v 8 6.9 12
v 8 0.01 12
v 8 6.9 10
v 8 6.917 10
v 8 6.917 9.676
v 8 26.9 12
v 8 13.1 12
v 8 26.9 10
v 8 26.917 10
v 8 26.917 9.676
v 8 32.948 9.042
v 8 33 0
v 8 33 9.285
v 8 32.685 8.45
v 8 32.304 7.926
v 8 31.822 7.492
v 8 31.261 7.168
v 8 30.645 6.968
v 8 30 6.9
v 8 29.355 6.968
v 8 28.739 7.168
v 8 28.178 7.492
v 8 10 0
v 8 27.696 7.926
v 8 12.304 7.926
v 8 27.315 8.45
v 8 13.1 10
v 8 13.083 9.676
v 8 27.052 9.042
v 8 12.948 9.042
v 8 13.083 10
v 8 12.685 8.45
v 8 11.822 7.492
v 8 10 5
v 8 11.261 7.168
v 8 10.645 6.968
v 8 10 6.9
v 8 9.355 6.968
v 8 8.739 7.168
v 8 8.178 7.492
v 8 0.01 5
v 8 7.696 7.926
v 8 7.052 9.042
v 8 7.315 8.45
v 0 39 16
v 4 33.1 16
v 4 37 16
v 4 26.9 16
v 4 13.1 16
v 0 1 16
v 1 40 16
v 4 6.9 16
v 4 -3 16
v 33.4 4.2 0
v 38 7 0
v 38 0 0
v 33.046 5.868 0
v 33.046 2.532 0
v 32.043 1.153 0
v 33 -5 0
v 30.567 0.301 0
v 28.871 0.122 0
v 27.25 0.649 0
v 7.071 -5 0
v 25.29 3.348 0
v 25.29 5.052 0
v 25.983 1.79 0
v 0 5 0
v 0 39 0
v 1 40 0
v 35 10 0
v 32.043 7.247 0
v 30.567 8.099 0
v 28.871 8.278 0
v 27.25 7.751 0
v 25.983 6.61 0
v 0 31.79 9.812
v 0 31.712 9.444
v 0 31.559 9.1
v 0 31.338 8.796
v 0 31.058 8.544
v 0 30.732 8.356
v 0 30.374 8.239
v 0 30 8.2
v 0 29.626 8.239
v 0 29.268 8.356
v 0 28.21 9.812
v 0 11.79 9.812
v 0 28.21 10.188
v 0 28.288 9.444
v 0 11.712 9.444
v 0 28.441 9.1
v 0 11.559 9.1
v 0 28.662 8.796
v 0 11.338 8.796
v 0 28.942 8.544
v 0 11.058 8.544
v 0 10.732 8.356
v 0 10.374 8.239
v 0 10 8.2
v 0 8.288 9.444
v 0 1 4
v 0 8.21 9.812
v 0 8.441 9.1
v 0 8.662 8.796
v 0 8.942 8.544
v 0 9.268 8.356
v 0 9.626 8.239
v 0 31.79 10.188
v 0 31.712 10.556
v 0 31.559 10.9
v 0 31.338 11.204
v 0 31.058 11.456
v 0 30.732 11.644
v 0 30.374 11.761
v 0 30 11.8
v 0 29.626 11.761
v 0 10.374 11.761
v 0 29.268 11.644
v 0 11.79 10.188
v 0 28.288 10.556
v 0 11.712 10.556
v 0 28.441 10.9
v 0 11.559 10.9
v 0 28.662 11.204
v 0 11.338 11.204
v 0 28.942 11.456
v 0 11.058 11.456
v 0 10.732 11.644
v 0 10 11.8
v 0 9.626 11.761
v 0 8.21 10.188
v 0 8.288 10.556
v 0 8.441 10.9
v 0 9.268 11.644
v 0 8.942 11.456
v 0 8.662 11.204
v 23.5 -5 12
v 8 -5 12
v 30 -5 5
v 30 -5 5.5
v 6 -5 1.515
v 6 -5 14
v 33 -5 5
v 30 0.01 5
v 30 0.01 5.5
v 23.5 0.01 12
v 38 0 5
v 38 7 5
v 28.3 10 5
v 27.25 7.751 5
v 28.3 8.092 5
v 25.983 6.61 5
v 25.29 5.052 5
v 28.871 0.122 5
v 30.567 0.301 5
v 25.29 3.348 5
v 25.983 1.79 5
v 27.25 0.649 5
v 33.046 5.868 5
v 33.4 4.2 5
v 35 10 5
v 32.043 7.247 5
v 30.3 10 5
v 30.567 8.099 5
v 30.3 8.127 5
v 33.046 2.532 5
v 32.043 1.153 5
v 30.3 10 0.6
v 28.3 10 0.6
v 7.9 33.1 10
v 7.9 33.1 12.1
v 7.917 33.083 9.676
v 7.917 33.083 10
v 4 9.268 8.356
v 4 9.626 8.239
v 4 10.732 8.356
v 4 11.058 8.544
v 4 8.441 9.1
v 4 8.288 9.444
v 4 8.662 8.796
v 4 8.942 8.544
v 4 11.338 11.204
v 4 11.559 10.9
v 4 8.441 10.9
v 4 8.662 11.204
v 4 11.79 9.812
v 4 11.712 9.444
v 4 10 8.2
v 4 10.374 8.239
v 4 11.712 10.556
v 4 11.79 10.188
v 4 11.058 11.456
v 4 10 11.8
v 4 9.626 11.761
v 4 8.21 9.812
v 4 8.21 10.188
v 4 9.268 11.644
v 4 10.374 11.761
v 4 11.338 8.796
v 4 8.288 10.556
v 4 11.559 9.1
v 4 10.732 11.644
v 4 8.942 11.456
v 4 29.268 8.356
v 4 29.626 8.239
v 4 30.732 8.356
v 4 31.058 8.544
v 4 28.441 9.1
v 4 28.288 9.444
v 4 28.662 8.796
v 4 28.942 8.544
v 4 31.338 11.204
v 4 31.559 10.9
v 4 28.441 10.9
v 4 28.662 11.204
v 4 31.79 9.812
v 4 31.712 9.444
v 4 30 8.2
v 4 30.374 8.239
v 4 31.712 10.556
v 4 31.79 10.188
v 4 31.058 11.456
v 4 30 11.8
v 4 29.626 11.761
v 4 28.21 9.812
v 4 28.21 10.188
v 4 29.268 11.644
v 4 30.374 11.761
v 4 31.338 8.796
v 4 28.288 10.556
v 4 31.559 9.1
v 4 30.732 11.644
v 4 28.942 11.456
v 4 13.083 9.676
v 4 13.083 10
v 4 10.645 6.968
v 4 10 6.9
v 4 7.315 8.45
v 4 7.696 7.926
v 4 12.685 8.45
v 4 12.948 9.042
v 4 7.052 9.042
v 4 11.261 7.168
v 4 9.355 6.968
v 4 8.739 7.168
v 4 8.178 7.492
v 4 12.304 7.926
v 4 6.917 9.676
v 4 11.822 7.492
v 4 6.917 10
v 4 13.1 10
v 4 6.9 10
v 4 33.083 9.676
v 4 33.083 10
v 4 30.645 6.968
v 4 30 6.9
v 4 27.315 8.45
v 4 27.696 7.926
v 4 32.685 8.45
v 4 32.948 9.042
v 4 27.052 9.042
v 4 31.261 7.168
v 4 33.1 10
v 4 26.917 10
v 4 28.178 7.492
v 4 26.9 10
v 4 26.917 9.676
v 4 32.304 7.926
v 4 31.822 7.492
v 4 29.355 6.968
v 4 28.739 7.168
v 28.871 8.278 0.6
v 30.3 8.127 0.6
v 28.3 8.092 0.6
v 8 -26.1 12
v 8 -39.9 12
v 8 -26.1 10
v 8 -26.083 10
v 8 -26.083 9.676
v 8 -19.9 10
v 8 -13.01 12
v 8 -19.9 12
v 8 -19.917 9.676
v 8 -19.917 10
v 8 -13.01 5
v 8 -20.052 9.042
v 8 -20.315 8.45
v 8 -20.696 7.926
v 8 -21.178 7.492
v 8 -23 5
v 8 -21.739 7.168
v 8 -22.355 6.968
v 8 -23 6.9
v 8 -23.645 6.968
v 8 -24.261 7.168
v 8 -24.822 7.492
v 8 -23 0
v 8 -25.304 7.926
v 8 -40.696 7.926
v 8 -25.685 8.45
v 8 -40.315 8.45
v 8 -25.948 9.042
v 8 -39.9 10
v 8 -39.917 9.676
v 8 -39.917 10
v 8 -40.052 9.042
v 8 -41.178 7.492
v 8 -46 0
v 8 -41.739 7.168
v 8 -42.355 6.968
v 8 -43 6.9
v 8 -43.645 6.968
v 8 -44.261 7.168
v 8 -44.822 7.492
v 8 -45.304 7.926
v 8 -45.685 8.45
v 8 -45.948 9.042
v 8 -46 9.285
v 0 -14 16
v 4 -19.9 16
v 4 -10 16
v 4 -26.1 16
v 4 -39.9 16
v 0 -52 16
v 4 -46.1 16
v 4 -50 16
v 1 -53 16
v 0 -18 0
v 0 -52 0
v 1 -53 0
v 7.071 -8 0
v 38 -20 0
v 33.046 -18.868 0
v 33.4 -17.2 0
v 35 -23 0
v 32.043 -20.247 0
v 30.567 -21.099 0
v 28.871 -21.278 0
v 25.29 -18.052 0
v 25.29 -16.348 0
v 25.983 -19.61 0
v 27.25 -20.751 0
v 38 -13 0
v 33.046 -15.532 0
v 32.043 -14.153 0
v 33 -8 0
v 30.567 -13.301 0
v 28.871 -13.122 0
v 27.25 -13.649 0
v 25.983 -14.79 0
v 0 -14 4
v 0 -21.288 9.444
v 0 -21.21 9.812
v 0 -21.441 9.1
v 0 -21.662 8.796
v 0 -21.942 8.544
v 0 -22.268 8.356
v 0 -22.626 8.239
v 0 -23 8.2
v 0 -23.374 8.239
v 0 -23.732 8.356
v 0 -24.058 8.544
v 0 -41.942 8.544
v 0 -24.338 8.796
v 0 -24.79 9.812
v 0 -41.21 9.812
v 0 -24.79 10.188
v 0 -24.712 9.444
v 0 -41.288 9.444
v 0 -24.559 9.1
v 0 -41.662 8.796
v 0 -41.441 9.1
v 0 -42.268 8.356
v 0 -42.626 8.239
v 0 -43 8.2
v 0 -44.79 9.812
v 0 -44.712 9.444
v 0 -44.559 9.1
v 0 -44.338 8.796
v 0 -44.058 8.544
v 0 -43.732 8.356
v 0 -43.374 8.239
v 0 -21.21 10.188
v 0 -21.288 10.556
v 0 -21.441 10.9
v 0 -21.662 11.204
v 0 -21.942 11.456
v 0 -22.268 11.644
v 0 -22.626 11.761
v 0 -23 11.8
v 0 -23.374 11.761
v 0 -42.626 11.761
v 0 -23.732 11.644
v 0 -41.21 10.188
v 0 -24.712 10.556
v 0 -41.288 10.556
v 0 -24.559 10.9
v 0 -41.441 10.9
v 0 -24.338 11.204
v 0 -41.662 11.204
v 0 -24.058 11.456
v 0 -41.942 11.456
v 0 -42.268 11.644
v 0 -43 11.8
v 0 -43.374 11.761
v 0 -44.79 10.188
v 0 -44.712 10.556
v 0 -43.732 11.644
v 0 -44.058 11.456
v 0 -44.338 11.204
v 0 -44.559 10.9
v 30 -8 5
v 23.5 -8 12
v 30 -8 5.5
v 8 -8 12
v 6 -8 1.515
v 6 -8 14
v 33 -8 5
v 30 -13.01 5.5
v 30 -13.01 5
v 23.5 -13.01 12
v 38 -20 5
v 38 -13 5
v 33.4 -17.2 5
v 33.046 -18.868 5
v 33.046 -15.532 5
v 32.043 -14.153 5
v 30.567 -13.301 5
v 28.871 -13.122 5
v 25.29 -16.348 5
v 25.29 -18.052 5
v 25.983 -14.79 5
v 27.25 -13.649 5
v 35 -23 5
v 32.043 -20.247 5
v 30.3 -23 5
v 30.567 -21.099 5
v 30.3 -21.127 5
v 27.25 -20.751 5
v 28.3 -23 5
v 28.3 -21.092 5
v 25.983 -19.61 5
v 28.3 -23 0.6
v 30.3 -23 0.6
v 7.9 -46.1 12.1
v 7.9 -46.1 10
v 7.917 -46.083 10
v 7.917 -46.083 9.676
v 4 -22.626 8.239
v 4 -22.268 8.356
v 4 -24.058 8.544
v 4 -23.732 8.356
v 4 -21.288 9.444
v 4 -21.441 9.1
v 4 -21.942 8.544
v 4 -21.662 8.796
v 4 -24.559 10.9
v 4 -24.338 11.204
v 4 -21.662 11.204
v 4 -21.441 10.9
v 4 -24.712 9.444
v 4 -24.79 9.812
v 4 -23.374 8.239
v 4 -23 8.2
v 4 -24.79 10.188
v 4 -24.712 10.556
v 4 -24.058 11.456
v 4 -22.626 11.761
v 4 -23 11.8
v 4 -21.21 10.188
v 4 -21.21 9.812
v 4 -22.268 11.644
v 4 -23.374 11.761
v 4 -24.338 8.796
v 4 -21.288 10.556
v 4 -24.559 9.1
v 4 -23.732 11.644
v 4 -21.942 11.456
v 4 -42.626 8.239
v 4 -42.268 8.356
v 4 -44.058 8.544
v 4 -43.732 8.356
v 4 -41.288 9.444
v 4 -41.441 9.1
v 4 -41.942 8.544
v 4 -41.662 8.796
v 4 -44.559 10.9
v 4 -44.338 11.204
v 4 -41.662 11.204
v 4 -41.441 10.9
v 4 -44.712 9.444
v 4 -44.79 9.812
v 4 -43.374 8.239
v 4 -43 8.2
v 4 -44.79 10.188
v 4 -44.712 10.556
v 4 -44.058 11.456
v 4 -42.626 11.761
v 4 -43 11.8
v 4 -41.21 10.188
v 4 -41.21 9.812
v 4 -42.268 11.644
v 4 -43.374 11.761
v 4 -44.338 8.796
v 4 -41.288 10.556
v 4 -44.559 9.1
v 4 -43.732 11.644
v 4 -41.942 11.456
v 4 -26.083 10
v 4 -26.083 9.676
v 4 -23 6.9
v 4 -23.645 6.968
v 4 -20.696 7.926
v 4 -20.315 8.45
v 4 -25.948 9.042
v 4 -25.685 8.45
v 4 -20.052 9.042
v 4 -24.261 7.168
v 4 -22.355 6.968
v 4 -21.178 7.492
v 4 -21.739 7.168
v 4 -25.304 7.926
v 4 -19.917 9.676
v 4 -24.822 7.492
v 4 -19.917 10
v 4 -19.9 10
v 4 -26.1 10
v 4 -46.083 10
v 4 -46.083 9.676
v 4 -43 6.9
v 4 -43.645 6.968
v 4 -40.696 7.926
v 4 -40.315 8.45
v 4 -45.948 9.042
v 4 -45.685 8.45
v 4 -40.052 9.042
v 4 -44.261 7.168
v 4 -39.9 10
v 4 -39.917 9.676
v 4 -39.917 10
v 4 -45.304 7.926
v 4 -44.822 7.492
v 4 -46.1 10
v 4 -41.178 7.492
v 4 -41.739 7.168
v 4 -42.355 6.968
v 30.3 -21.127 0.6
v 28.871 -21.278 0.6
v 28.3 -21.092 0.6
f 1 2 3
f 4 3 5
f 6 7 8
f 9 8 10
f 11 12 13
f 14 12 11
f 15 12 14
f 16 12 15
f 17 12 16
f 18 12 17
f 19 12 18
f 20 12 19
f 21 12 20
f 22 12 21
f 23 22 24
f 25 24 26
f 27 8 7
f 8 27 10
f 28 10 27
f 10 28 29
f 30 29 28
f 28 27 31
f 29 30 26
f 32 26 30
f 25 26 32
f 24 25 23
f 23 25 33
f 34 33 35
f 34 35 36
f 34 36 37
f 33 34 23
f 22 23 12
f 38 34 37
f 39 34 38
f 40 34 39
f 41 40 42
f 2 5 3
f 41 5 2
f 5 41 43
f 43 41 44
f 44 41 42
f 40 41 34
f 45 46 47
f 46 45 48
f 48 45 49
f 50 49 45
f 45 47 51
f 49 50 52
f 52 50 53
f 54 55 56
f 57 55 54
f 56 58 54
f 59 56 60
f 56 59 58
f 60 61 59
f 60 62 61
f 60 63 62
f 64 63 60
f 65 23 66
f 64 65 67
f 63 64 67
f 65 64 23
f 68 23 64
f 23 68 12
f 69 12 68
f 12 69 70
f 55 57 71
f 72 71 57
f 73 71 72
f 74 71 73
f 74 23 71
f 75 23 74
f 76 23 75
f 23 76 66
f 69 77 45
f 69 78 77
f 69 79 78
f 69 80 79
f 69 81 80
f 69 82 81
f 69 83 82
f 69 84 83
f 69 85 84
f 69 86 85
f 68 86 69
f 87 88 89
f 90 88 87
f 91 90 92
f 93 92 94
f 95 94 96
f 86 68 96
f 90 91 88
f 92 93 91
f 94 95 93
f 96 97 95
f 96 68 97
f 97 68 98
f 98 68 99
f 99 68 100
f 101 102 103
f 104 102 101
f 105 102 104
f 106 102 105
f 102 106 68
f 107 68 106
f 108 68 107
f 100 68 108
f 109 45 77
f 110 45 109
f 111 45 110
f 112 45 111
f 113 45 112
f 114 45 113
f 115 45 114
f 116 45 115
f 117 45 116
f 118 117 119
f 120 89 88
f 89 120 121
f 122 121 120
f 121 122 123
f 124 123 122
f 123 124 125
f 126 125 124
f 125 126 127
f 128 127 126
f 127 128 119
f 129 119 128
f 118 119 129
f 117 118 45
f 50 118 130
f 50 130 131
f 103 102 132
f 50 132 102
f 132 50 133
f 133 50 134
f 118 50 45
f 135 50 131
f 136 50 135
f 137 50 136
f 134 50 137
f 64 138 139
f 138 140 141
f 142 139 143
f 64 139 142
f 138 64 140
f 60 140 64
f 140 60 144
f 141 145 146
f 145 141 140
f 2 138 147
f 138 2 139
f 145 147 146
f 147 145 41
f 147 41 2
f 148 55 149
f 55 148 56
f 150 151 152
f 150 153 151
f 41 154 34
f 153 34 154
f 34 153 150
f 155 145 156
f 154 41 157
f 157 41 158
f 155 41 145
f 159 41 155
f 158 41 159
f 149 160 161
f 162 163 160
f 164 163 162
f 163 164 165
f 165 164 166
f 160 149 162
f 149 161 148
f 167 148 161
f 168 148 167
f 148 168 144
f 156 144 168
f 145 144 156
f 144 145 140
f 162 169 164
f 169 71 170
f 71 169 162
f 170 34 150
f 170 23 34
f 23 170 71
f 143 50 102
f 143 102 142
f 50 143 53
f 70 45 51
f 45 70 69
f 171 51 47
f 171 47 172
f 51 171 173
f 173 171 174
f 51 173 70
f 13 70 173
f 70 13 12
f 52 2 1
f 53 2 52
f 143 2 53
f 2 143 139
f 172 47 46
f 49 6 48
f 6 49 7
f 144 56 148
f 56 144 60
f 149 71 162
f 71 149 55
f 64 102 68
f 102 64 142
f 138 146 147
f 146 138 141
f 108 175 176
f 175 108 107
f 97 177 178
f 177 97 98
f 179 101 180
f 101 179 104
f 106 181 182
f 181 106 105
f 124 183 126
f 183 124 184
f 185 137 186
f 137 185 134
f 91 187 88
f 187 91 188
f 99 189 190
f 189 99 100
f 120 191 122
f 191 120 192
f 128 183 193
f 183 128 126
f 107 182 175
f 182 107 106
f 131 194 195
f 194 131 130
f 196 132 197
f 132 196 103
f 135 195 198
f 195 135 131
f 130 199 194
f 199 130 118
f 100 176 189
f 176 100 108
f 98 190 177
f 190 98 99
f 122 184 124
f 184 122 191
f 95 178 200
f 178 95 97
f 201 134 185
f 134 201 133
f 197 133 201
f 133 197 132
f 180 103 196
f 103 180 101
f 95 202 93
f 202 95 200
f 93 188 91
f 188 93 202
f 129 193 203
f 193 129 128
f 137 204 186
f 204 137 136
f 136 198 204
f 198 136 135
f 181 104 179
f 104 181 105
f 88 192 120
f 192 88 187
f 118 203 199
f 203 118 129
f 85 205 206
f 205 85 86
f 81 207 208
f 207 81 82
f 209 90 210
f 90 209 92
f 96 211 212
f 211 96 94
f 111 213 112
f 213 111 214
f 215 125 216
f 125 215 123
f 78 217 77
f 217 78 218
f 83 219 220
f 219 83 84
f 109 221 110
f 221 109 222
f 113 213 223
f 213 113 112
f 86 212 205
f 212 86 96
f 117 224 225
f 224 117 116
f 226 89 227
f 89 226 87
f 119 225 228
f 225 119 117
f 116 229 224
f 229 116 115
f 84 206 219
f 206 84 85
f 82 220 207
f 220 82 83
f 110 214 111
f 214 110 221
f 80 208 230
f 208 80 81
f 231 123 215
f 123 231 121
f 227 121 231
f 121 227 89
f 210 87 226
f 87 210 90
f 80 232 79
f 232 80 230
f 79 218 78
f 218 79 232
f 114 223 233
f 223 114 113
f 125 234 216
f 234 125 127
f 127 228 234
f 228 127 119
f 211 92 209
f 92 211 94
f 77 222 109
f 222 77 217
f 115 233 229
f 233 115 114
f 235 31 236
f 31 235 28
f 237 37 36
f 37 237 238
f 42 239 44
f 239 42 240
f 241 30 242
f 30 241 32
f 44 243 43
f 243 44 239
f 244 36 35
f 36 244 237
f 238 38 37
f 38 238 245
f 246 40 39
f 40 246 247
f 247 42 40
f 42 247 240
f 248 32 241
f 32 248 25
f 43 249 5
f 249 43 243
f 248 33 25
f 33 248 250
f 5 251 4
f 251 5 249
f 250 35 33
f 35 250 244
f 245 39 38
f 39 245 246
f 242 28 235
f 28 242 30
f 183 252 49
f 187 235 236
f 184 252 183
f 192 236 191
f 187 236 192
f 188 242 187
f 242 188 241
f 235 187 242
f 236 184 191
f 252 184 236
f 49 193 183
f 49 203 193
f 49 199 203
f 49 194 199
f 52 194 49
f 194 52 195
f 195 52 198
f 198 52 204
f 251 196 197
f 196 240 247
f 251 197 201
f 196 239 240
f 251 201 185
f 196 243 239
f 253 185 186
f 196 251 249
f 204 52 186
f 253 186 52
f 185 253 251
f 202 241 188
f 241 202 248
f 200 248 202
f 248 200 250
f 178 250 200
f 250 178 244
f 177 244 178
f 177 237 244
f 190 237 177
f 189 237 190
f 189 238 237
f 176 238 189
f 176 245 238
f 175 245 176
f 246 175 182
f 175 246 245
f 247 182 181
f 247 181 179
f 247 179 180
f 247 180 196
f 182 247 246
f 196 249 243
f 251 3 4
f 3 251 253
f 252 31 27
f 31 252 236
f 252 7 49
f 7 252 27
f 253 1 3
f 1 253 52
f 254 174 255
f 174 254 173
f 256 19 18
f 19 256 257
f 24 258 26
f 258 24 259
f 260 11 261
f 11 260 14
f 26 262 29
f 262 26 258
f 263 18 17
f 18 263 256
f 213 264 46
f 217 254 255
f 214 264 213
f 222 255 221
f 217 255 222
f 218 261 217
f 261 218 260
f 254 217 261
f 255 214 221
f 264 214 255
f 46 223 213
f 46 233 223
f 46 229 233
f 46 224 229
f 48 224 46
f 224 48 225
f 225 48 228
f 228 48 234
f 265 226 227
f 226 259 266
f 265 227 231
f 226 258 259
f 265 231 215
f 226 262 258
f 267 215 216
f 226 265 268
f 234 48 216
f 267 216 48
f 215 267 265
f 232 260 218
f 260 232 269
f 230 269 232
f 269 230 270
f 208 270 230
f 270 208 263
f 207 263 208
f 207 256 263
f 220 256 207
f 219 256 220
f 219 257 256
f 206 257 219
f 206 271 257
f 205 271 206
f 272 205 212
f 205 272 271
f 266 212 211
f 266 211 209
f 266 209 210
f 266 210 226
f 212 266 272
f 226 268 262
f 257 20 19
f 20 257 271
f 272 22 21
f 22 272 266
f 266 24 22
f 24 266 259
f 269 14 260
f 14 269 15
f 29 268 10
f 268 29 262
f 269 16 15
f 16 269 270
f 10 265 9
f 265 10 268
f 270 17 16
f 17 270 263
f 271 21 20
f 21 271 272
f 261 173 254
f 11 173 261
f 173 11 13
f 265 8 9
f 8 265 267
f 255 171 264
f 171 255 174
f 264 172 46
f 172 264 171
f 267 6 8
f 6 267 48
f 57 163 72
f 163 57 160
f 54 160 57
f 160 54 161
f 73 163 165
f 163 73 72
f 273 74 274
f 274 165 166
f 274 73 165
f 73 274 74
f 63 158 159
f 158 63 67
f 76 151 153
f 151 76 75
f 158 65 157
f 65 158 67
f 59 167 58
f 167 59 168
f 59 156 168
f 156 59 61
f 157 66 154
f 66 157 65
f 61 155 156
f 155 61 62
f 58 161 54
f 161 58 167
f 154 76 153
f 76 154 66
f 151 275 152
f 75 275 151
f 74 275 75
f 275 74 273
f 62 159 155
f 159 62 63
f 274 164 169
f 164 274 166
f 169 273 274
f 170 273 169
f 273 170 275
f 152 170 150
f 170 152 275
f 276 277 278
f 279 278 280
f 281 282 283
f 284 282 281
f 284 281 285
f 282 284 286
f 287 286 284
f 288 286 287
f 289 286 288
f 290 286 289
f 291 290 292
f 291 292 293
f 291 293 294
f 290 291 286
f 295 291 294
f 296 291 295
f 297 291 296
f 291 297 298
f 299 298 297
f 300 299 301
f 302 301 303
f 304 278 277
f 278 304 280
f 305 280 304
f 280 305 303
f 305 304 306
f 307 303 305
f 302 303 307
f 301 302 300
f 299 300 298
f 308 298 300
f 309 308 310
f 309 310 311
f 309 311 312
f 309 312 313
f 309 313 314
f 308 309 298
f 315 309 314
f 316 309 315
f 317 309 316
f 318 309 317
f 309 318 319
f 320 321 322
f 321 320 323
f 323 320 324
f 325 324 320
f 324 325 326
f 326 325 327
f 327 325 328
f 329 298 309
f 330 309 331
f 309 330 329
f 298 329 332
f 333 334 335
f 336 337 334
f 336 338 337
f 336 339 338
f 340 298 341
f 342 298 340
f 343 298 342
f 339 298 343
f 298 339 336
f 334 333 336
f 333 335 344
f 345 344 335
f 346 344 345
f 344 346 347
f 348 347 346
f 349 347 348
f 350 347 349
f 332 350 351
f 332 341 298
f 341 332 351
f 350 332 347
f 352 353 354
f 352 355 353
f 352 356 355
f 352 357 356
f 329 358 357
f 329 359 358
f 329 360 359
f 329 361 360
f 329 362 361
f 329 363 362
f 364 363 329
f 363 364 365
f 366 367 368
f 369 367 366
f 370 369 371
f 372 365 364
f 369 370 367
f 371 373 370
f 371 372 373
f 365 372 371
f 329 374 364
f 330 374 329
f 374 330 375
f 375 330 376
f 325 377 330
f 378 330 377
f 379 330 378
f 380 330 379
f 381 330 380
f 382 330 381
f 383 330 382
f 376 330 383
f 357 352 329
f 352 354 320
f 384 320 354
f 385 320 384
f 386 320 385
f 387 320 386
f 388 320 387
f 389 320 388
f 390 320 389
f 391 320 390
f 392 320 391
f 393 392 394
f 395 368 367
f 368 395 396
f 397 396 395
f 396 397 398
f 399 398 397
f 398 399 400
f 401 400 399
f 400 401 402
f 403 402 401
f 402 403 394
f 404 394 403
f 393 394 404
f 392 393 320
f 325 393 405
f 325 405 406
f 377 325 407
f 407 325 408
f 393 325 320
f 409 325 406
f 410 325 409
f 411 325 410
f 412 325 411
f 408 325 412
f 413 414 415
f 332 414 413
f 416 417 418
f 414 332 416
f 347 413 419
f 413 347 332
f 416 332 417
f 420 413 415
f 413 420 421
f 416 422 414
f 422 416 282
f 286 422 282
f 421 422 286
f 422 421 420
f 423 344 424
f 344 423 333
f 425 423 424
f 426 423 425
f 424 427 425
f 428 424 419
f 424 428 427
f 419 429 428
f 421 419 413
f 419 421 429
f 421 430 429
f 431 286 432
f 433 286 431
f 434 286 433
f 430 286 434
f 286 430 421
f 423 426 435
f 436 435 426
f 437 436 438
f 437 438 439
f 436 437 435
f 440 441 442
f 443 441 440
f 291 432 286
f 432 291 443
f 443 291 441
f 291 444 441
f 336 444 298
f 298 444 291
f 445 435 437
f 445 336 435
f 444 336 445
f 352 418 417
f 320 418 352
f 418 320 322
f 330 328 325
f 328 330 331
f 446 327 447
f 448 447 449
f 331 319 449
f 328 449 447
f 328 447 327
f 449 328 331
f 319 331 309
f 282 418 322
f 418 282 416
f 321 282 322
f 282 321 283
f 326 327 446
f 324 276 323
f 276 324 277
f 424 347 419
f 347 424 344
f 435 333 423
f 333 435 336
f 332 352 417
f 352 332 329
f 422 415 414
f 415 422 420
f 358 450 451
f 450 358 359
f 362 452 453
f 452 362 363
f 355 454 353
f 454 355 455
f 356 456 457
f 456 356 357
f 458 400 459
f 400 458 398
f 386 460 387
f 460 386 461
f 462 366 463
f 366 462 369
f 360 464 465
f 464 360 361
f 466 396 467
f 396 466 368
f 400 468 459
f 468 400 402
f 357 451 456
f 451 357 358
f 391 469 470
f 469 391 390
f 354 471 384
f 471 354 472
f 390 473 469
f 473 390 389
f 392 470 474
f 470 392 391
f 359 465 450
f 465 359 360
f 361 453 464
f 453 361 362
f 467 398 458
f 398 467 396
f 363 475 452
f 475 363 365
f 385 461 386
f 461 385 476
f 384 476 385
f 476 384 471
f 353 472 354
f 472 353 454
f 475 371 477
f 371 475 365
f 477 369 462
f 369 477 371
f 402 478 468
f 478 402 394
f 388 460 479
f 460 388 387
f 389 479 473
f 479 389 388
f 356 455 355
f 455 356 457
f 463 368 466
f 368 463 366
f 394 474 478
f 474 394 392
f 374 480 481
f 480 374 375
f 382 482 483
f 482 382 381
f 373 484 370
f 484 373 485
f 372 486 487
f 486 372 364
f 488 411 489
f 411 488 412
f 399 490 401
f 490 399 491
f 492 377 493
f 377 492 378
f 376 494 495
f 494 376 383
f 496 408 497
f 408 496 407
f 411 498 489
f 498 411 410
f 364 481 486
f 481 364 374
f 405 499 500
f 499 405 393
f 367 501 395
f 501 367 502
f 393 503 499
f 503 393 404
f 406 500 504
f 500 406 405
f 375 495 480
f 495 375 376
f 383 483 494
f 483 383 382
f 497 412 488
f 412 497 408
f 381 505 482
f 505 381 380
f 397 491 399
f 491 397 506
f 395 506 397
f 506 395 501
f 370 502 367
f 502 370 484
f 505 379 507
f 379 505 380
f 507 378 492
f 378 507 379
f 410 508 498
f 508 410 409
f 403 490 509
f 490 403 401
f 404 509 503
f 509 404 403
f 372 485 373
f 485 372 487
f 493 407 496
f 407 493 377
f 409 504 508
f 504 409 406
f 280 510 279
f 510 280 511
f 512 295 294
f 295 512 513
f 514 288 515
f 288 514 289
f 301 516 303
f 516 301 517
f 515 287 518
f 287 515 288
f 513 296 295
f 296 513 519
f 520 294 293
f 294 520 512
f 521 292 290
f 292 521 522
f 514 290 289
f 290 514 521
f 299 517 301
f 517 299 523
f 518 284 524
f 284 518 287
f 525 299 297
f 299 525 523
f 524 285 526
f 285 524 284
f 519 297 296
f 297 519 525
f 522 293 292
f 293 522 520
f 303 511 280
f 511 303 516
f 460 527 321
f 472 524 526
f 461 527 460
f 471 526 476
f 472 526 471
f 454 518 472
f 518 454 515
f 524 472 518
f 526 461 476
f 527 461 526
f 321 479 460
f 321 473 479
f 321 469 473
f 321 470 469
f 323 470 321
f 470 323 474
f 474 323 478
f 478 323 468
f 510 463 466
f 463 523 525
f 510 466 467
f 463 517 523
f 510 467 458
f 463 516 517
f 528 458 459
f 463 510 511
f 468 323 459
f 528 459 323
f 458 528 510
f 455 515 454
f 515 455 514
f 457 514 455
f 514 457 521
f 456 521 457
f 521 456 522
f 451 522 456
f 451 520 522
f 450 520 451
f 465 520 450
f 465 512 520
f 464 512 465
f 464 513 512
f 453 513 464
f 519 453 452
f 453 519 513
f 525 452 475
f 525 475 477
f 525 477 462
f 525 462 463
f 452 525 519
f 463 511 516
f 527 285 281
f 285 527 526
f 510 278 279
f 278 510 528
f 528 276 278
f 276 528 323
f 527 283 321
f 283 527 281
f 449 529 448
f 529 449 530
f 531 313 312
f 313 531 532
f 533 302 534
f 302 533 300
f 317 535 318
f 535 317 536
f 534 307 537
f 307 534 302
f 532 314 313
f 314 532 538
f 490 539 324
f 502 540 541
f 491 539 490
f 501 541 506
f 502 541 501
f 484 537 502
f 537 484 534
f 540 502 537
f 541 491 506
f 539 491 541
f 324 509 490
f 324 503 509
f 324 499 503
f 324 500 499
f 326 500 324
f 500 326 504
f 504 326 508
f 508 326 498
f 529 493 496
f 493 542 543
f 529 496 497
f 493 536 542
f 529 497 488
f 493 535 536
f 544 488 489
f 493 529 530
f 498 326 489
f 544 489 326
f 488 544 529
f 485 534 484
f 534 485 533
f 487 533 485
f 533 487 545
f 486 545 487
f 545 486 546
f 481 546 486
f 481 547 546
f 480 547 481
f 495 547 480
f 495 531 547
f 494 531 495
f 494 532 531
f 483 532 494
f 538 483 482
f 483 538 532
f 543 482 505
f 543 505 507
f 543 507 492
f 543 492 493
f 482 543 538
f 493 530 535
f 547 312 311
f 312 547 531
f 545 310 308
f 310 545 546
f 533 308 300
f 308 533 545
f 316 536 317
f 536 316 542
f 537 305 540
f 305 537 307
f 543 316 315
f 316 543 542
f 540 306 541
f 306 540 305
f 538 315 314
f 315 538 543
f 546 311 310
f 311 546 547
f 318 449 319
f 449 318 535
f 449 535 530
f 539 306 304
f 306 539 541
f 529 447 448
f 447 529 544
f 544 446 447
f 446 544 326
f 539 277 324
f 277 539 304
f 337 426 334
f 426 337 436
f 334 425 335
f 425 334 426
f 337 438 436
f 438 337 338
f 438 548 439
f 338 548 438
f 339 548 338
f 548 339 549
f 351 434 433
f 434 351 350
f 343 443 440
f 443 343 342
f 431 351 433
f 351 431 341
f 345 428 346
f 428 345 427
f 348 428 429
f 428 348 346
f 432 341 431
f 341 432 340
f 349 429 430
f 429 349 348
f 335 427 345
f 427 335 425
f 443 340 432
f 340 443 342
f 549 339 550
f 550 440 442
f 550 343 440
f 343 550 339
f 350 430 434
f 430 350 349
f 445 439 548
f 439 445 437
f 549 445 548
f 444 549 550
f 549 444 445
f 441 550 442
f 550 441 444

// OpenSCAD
// PRUSA iteration3
// Z axis top holder
// GNU GPL v3
// Josef Průša <iam@josefprusa.cz> and contributors
// http://www.reprap.org/wiki/Prusa_Mendel
// http://prusamendel.org

module z_top_base(){
    translate([0,-5,0]) cube([8,45,16]);    //plate touching the base
    translate([0,-5,0]) cube([30,5.01,12]); //plate touching the base
    translate([0,-5,0]) cube([38,15,5]);    //plate touching the base
}

module z_top_fancy(){
    //Corner cutouts
    translate([0.5,0.5,0])    rotate([0,0,-45-180]) translate([-15,0,-1]) cube([30,30,51]);
    translate([0.5,40-0.5,0]) rotate([0,0,-45+90])  translate([-15,0,-1]) cube([30,30,51]);
    translate([-4,40+5,0])    rotate([0,0,-45-0])   translate([0,0,-1])   cube([30,30,51]);
    translate([8,0,12])       rotate([0,-45,0])     translate([0,-5,0])   cube([30,50,30]);
    translate([38-2.5,-5+2.5,0])   rotate([0,0,-45-90]) translate([-15,0,-1]) cube([30,30,51]);
    translate([38-1.5,10-1.5,0])   rotate([0,0,-45])    translate([-15,0,-1]) cube([30,30,51]);
    translate([0,0,5])             rotate([45+180,0,0]) rotate([0,0,-45+90])  translate([0,0,-15]) cube([30,30,30]);

    //Stiffner cut out
    translate([30,0,5.5]) rotate([0,-45,0]) translate([0,-5,0]) cube([30,50,30]);
}

module z_top_holes(){
    //Screw holes
    translate([-1,10,10])    rotate([0,90,0]) cylinder(h = 20, r=1.8, $fn=30);
    translate([-1,10+20,10]) rotate([0,90,0]) cylinder(h = 20, r=1.8, $fn=30);

    //Screw heads
    translate([4,10,10])     rotate([0,90,0]) cylinder(h = 20, r=3.1, $fn=30);
    translate([4,10-3.1,10]) cube([10,6.2,10]);
    translate([4,10+20,10])  rotate([0,90,0]) cylinder(h = 20, r=3.1, $fn=30);
    translate([4,10+20-3.1,10]) cube([10,6.2,10]);

    //Z rod holder
    translate([25+4.3,4.2,-1]) rotate([0,0,0]) cylinder(h = 50, r=4.1, $fn=15);
    translate([25+4.3-1,3,0.6]) cube([2,10,7]); // it's bit up because it helps with printing
}

module z_top(){
    difference(){
        z_top_base();
        z_top_fancy();
        z_top_holes();
    }
    
    translate([0,-13,0]) mirror([0,1,0]) difference(){
        z_top_base();
        z_top_fancy();
        z_top_holes();
    }
}

//Final part
z_top();
